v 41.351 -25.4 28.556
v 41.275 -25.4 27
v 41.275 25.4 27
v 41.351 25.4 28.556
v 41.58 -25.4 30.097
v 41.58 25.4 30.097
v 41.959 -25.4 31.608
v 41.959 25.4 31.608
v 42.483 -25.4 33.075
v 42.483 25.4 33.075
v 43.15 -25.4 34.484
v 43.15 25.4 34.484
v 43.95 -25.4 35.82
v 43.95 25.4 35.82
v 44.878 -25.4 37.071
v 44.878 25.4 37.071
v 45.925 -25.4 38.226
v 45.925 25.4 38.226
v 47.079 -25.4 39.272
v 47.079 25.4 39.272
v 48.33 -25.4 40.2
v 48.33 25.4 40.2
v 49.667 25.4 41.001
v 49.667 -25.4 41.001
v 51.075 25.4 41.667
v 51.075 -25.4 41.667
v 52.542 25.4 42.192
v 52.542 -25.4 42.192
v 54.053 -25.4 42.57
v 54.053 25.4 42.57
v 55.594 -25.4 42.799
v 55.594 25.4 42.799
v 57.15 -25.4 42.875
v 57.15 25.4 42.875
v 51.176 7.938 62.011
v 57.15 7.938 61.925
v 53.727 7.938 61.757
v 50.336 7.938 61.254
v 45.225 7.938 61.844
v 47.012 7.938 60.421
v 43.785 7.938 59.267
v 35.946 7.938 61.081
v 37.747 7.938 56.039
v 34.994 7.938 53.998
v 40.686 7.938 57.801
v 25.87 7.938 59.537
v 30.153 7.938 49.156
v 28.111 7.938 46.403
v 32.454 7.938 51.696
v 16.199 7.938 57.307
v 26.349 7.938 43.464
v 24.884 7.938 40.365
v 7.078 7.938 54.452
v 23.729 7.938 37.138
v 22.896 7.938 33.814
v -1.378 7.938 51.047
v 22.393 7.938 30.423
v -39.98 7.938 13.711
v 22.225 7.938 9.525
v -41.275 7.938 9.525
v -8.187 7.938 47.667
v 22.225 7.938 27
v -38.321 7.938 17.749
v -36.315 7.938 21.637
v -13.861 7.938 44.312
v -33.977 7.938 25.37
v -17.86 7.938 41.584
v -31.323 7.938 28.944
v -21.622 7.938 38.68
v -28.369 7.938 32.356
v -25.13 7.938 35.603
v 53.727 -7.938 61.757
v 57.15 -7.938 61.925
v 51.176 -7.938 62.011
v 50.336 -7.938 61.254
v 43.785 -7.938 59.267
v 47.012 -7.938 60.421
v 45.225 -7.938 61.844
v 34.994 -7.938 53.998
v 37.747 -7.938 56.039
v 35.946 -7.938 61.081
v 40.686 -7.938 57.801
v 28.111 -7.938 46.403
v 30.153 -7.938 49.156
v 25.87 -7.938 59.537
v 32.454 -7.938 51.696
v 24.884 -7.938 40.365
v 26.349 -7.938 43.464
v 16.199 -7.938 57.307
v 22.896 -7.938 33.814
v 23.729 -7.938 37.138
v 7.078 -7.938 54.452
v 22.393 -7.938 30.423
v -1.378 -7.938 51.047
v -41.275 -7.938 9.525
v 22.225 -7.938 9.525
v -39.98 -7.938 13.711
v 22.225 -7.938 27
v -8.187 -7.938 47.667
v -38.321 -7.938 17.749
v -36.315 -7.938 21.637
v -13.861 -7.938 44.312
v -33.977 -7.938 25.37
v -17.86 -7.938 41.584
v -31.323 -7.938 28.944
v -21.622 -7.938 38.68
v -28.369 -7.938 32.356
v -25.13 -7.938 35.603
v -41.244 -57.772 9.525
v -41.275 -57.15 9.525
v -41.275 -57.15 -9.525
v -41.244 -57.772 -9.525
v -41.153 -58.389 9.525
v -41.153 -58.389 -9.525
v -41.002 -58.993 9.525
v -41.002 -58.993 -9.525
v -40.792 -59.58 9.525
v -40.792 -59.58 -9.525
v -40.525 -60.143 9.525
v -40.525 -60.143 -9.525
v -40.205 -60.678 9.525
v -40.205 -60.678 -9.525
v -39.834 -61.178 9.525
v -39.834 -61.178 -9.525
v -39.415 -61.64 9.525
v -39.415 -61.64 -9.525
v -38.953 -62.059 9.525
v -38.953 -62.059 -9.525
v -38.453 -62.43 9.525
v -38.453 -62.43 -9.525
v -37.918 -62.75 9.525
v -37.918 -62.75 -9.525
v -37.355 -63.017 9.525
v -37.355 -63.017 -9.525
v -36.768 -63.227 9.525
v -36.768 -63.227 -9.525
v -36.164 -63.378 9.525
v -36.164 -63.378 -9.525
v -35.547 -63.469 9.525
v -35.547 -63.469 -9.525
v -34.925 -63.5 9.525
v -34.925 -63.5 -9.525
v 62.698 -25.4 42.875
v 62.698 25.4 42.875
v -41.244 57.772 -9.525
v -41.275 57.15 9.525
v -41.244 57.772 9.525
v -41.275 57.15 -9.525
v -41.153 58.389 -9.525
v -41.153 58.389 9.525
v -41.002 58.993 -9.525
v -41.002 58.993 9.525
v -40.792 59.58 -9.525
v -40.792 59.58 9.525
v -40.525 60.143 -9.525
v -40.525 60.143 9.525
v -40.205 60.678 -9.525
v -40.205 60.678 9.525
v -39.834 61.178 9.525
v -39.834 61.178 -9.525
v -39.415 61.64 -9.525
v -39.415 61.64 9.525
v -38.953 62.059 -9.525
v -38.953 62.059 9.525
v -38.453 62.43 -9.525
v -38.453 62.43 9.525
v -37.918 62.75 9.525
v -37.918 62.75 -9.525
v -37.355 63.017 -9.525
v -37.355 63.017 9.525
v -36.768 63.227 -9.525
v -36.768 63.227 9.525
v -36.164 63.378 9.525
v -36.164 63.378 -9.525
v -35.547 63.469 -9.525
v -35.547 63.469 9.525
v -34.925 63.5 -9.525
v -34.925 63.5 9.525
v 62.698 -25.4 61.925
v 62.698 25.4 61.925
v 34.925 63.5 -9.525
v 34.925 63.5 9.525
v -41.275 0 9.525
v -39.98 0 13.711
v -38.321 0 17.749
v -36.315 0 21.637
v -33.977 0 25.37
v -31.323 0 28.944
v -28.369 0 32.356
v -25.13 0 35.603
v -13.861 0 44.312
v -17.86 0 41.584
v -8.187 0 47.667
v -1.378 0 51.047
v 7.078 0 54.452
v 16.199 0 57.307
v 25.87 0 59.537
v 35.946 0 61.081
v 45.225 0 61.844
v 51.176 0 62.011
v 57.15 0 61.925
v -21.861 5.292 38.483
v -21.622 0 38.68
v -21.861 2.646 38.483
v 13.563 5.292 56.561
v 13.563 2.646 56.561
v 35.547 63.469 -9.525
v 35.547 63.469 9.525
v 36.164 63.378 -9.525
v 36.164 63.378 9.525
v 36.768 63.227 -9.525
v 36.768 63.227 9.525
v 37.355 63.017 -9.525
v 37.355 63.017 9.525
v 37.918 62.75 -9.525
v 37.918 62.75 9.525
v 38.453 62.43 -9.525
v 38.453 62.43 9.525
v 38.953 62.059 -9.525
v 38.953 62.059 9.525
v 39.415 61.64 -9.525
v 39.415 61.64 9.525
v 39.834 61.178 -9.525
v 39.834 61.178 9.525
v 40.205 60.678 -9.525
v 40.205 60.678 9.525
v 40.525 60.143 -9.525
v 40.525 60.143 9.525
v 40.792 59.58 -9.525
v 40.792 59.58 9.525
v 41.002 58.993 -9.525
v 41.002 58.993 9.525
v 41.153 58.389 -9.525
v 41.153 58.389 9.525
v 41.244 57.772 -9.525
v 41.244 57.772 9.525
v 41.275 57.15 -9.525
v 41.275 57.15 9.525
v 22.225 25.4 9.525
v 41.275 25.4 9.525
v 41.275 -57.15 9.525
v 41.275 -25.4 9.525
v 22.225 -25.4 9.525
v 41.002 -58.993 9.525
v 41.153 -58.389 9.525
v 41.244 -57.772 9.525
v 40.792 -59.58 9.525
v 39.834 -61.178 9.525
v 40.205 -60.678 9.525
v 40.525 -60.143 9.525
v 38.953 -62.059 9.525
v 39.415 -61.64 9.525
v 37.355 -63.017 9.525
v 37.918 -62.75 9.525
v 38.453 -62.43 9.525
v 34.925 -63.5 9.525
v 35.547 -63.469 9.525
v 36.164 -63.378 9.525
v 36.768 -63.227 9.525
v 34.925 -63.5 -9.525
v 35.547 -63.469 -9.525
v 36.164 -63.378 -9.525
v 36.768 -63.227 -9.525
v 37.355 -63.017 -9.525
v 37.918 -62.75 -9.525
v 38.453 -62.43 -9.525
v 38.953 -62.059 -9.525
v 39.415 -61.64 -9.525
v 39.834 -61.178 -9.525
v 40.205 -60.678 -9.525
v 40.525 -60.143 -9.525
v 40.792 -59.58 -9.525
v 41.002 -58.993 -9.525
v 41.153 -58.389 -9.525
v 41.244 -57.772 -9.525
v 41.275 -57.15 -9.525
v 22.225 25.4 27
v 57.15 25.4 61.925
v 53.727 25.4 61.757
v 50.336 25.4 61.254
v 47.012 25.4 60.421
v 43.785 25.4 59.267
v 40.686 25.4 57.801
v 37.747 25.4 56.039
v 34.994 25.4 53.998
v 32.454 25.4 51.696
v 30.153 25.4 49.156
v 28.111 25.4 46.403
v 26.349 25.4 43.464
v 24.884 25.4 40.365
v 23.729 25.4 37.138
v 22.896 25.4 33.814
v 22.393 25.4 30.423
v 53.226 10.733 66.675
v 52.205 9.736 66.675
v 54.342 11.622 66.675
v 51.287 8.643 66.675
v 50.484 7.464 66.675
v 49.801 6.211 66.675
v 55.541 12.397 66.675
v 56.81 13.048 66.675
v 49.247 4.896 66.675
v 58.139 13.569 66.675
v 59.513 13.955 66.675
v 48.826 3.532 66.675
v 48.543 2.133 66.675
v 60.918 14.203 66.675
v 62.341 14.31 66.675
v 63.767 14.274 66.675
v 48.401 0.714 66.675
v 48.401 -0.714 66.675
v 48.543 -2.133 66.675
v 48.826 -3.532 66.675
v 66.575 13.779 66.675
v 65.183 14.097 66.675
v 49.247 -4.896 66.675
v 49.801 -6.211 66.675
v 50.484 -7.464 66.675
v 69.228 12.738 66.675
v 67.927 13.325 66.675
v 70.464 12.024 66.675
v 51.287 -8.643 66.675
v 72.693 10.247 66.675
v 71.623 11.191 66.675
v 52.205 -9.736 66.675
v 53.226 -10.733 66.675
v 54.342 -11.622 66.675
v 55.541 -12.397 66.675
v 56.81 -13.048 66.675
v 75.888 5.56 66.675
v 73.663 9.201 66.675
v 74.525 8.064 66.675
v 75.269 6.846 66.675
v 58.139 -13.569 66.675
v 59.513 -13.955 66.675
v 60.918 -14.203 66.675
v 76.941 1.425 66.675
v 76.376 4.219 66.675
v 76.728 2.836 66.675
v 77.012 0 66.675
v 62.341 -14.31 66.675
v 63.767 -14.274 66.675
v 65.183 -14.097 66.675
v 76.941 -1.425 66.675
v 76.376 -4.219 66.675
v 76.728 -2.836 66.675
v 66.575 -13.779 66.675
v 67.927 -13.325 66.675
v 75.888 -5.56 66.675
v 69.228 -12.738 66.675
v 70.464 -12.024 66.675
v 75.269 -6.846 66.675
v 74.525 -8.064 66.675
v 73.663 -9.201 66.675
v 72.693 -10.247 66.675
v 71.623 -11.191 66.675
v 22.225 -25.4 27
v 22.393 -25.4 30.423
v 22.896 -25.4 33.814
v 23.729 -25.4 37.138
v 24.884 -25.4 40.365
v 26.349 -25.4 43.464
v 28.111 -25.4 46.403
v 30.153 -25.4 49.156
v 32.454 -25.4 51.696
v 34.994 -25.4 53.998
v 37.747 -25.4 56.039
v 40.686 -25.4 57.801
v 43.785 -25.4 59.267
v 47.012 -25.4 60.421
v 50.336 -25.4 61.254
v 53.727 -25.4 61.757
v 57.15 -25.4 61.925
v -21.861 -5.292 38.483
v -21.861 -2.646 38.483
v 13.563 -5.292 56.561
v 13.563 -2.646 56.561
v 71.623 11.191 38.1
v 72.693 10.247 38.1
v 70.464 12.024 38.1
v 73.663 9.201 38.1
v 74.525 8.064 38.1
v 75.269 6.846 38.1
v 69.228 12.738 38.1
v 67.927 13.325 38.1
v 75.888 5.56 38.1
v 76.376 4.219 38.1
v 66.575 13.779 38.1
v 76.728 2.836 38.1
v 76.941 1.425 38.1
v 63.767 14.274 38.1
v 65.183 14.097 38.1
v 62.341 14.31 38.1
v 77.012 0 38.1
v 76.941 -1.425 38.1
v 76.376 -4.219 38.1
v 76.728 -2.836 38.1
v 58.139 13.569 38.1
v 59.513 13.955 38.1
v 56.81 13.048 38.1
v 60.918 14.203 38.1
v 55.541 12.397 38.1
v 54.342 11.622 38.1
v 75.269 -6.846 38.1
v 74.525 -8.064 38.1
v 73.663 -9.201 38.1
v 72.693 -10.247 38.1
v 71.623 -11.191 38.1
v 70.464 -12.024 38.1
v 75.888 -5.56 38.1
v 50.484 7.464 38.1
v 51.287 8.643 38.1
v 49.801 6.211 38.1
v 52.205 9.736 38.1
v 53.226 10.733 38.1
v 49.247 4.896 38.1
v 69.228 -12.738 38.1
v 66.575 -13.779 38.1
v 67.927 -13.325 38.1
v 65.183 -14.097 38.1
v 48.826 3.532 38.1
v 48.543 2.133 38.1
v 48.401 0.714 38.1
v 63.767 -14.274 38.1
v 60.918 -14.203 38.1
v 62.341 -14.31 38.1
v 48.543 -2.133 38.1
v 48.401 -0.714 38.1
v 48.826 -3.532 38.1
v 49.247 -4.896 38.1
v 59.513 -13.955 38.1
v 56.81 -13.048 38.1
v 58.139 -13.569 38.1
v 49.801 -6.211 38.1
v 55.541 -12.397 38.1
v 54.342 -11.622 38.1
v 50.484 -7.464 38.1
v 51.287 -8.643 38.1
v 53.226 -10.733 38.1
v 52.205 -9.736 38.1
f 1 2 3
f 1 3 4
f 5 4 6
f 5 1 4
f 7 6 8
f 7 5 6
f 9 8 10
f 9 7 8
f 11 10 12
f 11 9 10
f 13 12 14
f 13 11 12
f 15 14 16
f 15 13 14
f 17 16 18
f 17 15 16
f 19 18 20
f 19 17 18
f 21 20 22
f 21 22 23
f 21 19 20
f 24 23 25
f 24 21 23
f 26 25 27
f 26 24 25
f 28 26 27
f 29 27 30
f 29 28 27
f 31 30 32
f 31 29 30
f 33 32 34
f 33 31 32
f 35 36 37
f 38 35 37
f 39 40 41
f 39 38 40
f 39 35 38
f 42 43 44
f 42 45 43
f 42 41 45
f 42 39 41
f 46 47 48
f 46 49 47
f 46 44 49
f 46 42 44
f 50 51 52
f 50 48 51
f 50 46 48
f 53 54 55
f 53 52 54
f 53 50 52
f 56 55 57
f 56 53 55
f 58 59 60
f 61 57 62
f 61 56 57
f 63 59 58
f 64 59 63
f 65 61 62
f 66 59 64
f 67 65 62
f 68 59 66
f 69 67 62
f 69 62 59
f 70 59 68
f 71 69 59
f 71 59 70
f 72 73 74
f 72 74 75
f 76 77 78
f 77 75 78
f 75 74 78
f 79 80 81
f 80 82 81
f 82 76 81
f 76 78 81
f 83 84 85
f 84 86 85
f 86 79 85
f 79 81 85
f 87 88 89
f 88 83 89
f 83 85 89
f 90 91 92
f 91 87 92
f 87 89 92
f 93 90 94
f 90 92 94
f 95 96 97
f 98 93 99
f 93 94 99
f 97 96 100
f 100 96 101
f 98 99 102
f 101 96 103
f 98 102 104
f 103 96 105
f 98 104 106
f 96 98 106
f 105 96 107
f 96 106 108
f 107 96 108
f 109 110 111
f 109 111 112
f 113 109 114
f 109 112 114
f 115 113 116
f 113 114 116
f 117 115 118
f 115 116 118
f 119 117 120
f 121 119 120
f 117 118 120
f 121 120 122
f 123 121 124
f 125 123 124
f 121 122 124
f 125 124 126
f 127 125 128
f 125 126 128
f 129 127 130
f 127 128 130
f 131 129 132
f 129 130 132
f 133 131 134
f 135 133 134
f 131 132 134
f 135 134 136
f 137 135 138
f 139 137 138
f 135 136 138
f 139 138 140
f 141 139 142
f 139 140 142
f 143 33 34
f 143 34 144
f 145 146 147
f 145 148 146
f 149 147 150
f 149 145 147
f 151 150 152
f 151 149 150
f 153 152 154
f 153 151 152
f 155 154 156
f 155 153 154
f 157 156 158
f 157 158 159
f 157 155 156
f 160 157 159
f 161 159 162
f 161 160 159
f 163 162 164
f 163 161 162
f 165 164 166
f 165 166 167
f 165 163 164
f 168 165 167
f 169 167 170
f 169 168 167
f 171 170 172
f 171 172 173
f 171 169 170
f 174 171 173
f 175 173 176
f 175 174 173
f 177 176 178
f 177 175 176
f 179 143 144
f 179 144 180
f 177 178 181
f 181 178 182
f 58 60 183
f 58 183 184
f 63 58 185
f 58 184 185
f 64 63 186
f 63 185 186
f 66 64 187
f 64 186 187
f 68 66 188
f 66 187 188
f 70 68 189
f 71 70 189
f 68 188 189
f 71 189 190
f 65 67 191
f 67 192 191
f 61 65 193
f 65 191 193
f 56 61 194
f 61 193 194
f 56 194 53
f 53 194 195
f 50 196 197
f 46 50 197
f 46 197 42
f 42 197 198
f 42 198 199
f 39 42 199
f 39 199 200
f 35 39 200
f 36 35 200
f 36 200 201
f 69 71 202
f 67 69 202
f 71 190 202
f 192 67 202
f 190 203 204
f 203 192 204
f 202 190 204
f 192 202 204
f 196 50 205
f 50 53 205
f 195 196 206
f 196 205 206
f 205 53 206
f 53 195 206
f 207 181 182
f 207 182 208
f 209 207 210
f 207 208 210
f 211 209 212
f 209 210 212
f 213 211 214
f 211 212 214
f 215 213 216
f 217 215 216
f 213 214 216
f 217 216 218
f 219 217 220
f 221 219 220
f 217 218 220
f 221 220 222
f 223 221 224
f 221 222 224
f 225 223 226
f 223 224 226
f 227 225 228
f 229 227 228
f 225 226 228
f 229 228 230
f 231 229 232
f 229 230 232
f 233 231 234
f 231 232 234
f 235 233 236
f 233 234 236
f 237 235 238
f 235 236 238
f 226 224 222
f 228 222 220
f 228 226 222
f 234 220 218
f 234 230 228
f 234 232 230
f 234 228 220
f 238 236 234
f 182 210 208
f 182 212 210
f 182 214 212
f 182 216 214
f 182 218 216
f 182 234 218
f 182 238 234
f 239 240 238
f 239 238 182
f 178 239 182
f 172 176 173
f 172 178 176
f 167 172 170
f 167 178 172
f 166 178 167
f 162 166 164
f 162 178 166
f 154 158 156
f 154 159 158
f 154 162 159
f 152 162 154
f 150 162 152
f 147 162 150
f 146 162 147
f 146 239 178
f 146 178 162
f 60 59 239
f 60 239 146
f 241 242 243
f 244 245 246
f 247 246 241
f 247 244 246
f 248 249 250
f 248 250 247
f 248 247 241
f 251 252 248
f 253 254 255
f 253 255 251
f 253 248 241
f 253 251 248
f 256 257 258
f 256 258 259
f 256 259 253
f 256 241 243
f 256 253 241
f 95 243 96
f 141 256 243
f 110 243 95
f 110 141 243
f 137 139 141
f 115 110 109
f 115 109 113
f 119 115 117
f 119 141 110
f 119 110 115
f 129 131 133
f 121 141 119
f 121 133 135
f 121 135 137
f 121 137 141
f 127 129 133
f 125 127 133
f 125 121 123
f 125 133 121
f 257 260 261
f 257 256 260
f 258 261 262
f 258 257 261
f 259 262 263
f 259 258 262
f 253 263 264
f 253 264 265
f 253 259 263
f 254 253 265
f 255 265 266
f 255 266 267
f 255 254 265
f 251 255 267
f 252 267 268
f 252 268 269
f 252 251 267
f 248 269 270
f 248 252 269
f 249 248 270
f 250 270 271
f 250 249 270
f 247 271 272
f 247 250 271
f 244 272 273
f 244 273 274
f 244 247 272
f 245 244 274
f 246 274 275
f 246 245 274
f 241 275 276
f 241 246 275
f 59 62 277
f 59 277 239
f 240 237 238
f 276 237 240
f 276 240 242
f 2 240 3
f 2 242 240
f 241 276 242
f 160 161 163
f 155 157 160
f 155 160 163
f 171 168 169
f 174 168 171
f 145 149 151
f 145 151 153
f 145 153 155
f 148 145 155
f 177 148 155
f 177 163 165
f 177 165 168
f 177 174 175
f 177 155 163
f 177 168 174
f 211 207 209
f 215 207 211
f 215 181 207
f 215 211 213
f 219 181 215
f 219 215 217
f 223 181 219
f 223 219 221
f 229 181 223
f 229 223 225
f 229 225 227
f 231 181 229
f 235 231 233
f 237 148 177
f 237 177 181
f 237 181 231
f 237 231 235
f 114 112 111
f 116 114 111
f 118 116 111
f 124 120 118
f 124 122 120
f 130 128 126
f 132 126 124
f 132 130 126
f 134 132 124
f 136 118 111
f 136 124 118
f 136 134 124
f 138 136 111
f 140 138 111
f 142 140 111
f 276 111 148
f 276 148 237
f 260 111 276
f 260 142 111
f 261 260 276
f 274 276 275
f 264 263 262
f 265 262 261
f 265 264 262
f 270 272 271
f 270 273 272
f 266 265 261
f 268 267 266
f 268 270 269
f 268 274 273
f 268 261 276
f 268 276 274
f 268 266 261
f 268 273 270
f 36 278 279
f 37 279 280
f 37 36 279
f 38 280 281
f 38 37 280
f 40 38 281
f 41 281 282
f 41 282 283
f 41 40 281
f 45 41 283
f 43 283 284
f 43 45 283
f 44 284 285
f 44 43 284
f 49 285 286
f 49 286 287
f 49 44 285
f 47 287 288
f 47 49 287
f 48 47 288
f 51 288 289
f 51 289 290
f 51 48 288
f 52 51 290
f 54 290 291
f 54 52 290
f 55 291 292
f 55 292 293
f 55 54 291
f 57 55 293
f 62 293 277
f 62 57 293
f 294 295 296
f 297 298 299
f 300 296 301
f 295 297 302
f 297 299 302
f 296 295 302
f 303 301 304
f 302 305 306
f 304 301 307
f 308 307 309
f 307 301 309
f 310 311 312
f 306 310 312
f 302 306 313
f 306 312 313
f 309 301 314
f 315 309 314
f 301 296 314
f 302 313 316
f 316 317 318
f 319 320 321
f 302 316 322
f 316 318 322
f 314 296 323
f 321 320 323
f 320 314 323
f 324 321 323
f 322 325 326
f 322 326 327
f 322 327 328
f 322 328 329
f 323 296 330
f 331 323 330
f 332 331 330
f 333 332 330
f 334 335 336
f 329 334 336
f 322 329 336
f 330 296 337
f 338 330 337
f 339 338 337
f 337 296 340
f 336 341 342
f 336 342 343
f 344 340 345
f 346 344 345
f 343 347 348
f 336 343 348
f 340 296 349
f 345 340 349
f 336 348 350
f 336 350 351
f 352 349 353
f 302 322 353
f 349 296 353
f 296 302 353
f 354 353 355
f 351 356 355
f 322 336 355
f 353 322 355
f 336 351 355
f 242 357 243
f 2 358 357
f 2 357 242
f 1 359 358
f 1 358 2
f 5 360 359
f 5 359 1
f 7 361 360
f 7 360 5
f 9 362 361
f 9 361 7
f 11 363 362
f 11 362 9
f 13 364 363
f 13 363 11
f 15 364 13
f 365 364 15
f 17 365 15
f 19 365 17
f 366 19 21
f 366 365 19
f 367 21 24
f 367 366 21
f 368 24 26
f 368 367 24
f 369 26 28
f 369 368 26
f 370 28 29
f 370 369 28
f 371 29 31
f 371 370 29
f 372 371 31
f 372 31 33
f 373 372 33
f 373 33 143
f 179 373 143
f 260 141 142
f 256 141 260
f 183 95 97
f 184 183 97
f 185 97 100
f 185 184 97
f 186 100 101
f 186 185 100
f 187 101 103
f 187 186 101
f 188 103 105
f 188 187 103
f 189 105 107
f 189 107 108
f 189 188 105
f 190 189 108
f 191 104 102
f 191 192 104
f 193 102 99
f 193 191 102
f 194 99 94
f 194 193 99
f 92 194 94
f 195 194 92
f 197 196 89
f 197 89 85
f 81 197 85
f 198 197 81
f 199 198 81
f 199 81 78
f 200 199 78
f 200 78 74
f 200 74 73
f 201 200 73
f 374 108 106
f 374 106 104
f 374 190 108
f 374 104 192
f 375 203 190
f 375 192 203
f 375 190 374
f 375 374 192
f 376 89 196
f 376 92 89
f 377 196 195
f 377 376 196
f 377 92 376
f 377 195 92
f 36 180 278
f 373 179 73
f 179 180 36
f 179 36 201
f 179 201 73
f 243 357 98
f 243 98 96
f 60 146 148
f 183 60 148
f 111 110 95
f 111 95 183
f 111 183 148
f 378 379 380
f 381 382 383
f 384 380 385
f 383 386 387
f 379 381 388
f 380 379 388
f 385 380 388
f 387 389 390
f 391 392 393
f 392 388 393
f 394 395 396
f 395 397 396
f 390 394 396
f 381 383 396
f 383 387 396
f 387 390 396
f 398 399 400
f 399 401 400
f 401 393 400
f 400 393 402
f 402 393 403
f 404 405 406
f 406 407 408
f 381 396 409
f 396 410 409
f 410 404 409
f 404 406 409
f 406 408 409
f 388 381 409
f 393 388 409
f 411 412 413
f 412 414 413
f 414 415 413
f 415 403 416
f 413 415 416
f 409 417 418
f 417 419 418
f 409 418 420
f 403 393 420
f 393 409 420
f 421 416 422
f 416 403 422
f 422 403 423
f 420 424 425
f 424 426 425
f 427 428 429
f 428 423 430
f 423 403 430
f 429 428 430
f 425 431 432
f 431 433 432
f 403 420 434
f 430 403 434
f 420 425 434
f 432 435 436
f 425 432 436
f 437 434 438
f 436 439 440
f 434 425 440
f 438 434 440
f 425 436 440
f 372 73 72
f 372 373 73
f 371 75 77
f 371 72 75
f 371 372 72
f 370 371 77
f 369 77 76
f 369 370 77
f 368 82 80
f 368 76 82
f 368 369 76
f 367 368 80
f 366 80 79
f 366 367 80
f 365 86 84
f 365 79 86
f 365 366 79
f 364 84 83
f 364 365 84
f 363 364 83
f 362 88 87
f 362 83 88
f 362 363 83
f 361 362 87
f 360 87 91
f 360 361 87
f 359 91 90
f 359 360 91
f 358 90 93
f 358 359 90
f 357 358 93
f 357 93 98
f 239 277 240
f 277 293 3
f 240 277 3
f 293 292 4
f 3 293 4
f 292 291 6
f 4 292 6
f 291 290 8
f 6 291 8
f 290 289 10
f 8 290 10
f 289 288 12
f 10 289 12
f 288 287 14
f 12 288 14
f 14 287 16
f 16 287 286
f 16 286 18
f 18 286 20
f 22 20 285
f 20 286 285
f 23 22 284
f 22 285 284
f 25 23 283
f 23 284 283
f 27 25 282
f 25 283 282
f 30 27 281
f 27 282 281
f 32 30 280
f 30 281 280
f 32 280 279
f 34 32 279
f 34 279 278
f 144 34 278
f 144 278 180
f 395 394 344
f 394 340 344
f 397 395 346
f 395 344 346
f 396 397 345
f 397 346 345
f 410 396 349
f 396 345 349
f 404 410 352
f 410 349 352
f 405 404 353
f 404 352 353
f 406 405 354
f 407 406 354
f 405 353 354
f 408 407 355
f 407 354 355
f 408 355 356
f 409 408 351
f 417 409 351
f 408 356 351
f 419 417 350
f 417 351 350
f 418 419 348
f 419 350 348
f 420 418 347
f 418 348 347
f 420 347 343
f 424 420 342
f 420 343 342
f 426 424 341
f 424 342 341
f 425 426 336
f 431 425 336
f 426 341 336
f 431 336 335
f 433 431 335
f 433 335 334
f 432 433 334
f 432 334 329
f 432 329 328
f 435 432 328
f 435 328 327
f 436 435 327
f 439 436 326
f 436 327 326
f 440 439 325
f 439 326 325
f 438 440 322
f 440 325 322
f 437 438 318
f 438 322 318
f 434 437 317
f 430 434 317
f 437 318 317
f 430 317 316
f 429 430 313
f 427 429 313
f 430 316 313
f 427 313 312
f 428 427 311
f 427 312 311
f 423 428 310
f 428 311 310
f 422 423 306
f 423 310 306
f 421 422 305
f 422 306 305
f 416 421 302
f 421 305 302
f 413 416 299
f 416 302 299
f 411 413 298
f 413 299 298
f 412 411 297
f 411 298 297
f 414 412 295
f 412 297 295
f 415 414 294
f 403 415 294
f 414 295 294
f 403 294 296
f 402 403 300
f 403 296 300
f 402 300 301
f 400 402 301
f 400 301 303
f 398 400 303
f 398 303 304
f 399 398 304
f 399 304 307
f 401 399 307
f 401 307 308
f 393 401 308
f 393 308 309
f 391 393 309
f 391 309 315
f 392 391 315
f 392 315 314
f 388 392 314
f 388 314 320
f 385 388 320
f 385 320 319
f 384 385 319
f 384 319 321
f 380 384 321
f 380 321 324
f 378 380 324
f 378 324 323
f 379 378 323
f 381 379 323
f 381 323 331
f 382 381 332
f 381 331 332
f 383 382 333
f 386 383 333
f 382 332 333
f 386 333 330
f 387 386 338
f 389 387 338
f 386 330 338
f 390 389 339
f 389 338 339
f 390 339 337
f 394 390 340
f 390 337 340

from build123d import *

# Parameters (mm, degrees)
F1_DEPTH = 63.5
F2_DEPTH = 25.4
F3_DEPTH = 7.9375
F5_R     = 6.35


with BuildPart() as f1:
    # F0 (on Front) → F1 (new body, symmetric)
    with BuildSketch(Plane.XZ):
        Polygon((22.225, 9.525), (-41.275, 9.525), (-41.275, -9.525), (41.275, -9.525), (41.275, 9.525), align=None)
    extrude(amount=F1_DEPTH, both=True)

    # F0 (on Front) → F2 (join, symmetric)
    with BuildSketch(Plane.XZ):
        with BuildLine():
            Line((22.225, 27.0002), (22.225, 9.525))
            Line((22.225, 9.525), (41.275, 9.525))
            Line((41.275, 9.525), (41.275, 27.0002))
            ThreePointArc((41.275, 27.0002), (45.92468, 38.22552), (57.15, 42.8752))
            Line((57.15, 42.8752), (62.697773, 42.8752))
            Line((62.697773, 42.8752), (62.697773, 61.9252))
            Line((62.697773, 61.9252), (57.15, 61.9252))
            ThreePointArc((57.15, 61.9252), (32.454296, 51.695904), (22.225, 27.0002))
        make_face()
    extrude(amount=F2_DEPTH, both=True)

    # F0 (on Front) → F3 (join, symmetric)
    with BuildSketch(Plane.XZ):
        with BuildLine():
            add(Edge.make_bspline(
                [(-41.275, 9.525), (-32.480557, 43.31116), (12.096889, 63.529342), (57.15, 61.9252)],
                knots=[0, 0, 0, 0, 111.504536, 111.504536, 111.504536, 111.504536], degree=3))
            Line((-41.275, 9.525), (22.225, 9.525))
            Line((22.225, 9.525), (22.225, 27.0002))
            ThreePointArc((22.225, 27.0002), (32.454296, 51.695904), (57.15, 61.9252))
        make_face()
    extrude(amount=F3_DEPTH, both=True)

    # F5
    f5_edges = [f1.edges().sort_by_distance(p)[0] for p in [
        (-41.275, -63.5, 0),
        (41.275, -63.5, 0),
        (41.275, 63.5, 0),
        (-41.275, 63.5, 0),
    ]]
    fillet(f5_edges, radius=F5_R)


with BuildPart() as f4:
    # F0 (on Front) → F4 (revolve)
    with BuildSketch(Plane.XZ):
        Polygon((62.697773, 66.675), (62.697773, 61.9252), (62.697773, 42.8752), (62.697773, 38.1), (77.01204, 38.1), (77.01204, 66.675), align=None)
    revolve(axis=Axis((62.697773, 0, 52.3875), (0, 0, -1)))


solid = Compound([f1.part, f4.part])
